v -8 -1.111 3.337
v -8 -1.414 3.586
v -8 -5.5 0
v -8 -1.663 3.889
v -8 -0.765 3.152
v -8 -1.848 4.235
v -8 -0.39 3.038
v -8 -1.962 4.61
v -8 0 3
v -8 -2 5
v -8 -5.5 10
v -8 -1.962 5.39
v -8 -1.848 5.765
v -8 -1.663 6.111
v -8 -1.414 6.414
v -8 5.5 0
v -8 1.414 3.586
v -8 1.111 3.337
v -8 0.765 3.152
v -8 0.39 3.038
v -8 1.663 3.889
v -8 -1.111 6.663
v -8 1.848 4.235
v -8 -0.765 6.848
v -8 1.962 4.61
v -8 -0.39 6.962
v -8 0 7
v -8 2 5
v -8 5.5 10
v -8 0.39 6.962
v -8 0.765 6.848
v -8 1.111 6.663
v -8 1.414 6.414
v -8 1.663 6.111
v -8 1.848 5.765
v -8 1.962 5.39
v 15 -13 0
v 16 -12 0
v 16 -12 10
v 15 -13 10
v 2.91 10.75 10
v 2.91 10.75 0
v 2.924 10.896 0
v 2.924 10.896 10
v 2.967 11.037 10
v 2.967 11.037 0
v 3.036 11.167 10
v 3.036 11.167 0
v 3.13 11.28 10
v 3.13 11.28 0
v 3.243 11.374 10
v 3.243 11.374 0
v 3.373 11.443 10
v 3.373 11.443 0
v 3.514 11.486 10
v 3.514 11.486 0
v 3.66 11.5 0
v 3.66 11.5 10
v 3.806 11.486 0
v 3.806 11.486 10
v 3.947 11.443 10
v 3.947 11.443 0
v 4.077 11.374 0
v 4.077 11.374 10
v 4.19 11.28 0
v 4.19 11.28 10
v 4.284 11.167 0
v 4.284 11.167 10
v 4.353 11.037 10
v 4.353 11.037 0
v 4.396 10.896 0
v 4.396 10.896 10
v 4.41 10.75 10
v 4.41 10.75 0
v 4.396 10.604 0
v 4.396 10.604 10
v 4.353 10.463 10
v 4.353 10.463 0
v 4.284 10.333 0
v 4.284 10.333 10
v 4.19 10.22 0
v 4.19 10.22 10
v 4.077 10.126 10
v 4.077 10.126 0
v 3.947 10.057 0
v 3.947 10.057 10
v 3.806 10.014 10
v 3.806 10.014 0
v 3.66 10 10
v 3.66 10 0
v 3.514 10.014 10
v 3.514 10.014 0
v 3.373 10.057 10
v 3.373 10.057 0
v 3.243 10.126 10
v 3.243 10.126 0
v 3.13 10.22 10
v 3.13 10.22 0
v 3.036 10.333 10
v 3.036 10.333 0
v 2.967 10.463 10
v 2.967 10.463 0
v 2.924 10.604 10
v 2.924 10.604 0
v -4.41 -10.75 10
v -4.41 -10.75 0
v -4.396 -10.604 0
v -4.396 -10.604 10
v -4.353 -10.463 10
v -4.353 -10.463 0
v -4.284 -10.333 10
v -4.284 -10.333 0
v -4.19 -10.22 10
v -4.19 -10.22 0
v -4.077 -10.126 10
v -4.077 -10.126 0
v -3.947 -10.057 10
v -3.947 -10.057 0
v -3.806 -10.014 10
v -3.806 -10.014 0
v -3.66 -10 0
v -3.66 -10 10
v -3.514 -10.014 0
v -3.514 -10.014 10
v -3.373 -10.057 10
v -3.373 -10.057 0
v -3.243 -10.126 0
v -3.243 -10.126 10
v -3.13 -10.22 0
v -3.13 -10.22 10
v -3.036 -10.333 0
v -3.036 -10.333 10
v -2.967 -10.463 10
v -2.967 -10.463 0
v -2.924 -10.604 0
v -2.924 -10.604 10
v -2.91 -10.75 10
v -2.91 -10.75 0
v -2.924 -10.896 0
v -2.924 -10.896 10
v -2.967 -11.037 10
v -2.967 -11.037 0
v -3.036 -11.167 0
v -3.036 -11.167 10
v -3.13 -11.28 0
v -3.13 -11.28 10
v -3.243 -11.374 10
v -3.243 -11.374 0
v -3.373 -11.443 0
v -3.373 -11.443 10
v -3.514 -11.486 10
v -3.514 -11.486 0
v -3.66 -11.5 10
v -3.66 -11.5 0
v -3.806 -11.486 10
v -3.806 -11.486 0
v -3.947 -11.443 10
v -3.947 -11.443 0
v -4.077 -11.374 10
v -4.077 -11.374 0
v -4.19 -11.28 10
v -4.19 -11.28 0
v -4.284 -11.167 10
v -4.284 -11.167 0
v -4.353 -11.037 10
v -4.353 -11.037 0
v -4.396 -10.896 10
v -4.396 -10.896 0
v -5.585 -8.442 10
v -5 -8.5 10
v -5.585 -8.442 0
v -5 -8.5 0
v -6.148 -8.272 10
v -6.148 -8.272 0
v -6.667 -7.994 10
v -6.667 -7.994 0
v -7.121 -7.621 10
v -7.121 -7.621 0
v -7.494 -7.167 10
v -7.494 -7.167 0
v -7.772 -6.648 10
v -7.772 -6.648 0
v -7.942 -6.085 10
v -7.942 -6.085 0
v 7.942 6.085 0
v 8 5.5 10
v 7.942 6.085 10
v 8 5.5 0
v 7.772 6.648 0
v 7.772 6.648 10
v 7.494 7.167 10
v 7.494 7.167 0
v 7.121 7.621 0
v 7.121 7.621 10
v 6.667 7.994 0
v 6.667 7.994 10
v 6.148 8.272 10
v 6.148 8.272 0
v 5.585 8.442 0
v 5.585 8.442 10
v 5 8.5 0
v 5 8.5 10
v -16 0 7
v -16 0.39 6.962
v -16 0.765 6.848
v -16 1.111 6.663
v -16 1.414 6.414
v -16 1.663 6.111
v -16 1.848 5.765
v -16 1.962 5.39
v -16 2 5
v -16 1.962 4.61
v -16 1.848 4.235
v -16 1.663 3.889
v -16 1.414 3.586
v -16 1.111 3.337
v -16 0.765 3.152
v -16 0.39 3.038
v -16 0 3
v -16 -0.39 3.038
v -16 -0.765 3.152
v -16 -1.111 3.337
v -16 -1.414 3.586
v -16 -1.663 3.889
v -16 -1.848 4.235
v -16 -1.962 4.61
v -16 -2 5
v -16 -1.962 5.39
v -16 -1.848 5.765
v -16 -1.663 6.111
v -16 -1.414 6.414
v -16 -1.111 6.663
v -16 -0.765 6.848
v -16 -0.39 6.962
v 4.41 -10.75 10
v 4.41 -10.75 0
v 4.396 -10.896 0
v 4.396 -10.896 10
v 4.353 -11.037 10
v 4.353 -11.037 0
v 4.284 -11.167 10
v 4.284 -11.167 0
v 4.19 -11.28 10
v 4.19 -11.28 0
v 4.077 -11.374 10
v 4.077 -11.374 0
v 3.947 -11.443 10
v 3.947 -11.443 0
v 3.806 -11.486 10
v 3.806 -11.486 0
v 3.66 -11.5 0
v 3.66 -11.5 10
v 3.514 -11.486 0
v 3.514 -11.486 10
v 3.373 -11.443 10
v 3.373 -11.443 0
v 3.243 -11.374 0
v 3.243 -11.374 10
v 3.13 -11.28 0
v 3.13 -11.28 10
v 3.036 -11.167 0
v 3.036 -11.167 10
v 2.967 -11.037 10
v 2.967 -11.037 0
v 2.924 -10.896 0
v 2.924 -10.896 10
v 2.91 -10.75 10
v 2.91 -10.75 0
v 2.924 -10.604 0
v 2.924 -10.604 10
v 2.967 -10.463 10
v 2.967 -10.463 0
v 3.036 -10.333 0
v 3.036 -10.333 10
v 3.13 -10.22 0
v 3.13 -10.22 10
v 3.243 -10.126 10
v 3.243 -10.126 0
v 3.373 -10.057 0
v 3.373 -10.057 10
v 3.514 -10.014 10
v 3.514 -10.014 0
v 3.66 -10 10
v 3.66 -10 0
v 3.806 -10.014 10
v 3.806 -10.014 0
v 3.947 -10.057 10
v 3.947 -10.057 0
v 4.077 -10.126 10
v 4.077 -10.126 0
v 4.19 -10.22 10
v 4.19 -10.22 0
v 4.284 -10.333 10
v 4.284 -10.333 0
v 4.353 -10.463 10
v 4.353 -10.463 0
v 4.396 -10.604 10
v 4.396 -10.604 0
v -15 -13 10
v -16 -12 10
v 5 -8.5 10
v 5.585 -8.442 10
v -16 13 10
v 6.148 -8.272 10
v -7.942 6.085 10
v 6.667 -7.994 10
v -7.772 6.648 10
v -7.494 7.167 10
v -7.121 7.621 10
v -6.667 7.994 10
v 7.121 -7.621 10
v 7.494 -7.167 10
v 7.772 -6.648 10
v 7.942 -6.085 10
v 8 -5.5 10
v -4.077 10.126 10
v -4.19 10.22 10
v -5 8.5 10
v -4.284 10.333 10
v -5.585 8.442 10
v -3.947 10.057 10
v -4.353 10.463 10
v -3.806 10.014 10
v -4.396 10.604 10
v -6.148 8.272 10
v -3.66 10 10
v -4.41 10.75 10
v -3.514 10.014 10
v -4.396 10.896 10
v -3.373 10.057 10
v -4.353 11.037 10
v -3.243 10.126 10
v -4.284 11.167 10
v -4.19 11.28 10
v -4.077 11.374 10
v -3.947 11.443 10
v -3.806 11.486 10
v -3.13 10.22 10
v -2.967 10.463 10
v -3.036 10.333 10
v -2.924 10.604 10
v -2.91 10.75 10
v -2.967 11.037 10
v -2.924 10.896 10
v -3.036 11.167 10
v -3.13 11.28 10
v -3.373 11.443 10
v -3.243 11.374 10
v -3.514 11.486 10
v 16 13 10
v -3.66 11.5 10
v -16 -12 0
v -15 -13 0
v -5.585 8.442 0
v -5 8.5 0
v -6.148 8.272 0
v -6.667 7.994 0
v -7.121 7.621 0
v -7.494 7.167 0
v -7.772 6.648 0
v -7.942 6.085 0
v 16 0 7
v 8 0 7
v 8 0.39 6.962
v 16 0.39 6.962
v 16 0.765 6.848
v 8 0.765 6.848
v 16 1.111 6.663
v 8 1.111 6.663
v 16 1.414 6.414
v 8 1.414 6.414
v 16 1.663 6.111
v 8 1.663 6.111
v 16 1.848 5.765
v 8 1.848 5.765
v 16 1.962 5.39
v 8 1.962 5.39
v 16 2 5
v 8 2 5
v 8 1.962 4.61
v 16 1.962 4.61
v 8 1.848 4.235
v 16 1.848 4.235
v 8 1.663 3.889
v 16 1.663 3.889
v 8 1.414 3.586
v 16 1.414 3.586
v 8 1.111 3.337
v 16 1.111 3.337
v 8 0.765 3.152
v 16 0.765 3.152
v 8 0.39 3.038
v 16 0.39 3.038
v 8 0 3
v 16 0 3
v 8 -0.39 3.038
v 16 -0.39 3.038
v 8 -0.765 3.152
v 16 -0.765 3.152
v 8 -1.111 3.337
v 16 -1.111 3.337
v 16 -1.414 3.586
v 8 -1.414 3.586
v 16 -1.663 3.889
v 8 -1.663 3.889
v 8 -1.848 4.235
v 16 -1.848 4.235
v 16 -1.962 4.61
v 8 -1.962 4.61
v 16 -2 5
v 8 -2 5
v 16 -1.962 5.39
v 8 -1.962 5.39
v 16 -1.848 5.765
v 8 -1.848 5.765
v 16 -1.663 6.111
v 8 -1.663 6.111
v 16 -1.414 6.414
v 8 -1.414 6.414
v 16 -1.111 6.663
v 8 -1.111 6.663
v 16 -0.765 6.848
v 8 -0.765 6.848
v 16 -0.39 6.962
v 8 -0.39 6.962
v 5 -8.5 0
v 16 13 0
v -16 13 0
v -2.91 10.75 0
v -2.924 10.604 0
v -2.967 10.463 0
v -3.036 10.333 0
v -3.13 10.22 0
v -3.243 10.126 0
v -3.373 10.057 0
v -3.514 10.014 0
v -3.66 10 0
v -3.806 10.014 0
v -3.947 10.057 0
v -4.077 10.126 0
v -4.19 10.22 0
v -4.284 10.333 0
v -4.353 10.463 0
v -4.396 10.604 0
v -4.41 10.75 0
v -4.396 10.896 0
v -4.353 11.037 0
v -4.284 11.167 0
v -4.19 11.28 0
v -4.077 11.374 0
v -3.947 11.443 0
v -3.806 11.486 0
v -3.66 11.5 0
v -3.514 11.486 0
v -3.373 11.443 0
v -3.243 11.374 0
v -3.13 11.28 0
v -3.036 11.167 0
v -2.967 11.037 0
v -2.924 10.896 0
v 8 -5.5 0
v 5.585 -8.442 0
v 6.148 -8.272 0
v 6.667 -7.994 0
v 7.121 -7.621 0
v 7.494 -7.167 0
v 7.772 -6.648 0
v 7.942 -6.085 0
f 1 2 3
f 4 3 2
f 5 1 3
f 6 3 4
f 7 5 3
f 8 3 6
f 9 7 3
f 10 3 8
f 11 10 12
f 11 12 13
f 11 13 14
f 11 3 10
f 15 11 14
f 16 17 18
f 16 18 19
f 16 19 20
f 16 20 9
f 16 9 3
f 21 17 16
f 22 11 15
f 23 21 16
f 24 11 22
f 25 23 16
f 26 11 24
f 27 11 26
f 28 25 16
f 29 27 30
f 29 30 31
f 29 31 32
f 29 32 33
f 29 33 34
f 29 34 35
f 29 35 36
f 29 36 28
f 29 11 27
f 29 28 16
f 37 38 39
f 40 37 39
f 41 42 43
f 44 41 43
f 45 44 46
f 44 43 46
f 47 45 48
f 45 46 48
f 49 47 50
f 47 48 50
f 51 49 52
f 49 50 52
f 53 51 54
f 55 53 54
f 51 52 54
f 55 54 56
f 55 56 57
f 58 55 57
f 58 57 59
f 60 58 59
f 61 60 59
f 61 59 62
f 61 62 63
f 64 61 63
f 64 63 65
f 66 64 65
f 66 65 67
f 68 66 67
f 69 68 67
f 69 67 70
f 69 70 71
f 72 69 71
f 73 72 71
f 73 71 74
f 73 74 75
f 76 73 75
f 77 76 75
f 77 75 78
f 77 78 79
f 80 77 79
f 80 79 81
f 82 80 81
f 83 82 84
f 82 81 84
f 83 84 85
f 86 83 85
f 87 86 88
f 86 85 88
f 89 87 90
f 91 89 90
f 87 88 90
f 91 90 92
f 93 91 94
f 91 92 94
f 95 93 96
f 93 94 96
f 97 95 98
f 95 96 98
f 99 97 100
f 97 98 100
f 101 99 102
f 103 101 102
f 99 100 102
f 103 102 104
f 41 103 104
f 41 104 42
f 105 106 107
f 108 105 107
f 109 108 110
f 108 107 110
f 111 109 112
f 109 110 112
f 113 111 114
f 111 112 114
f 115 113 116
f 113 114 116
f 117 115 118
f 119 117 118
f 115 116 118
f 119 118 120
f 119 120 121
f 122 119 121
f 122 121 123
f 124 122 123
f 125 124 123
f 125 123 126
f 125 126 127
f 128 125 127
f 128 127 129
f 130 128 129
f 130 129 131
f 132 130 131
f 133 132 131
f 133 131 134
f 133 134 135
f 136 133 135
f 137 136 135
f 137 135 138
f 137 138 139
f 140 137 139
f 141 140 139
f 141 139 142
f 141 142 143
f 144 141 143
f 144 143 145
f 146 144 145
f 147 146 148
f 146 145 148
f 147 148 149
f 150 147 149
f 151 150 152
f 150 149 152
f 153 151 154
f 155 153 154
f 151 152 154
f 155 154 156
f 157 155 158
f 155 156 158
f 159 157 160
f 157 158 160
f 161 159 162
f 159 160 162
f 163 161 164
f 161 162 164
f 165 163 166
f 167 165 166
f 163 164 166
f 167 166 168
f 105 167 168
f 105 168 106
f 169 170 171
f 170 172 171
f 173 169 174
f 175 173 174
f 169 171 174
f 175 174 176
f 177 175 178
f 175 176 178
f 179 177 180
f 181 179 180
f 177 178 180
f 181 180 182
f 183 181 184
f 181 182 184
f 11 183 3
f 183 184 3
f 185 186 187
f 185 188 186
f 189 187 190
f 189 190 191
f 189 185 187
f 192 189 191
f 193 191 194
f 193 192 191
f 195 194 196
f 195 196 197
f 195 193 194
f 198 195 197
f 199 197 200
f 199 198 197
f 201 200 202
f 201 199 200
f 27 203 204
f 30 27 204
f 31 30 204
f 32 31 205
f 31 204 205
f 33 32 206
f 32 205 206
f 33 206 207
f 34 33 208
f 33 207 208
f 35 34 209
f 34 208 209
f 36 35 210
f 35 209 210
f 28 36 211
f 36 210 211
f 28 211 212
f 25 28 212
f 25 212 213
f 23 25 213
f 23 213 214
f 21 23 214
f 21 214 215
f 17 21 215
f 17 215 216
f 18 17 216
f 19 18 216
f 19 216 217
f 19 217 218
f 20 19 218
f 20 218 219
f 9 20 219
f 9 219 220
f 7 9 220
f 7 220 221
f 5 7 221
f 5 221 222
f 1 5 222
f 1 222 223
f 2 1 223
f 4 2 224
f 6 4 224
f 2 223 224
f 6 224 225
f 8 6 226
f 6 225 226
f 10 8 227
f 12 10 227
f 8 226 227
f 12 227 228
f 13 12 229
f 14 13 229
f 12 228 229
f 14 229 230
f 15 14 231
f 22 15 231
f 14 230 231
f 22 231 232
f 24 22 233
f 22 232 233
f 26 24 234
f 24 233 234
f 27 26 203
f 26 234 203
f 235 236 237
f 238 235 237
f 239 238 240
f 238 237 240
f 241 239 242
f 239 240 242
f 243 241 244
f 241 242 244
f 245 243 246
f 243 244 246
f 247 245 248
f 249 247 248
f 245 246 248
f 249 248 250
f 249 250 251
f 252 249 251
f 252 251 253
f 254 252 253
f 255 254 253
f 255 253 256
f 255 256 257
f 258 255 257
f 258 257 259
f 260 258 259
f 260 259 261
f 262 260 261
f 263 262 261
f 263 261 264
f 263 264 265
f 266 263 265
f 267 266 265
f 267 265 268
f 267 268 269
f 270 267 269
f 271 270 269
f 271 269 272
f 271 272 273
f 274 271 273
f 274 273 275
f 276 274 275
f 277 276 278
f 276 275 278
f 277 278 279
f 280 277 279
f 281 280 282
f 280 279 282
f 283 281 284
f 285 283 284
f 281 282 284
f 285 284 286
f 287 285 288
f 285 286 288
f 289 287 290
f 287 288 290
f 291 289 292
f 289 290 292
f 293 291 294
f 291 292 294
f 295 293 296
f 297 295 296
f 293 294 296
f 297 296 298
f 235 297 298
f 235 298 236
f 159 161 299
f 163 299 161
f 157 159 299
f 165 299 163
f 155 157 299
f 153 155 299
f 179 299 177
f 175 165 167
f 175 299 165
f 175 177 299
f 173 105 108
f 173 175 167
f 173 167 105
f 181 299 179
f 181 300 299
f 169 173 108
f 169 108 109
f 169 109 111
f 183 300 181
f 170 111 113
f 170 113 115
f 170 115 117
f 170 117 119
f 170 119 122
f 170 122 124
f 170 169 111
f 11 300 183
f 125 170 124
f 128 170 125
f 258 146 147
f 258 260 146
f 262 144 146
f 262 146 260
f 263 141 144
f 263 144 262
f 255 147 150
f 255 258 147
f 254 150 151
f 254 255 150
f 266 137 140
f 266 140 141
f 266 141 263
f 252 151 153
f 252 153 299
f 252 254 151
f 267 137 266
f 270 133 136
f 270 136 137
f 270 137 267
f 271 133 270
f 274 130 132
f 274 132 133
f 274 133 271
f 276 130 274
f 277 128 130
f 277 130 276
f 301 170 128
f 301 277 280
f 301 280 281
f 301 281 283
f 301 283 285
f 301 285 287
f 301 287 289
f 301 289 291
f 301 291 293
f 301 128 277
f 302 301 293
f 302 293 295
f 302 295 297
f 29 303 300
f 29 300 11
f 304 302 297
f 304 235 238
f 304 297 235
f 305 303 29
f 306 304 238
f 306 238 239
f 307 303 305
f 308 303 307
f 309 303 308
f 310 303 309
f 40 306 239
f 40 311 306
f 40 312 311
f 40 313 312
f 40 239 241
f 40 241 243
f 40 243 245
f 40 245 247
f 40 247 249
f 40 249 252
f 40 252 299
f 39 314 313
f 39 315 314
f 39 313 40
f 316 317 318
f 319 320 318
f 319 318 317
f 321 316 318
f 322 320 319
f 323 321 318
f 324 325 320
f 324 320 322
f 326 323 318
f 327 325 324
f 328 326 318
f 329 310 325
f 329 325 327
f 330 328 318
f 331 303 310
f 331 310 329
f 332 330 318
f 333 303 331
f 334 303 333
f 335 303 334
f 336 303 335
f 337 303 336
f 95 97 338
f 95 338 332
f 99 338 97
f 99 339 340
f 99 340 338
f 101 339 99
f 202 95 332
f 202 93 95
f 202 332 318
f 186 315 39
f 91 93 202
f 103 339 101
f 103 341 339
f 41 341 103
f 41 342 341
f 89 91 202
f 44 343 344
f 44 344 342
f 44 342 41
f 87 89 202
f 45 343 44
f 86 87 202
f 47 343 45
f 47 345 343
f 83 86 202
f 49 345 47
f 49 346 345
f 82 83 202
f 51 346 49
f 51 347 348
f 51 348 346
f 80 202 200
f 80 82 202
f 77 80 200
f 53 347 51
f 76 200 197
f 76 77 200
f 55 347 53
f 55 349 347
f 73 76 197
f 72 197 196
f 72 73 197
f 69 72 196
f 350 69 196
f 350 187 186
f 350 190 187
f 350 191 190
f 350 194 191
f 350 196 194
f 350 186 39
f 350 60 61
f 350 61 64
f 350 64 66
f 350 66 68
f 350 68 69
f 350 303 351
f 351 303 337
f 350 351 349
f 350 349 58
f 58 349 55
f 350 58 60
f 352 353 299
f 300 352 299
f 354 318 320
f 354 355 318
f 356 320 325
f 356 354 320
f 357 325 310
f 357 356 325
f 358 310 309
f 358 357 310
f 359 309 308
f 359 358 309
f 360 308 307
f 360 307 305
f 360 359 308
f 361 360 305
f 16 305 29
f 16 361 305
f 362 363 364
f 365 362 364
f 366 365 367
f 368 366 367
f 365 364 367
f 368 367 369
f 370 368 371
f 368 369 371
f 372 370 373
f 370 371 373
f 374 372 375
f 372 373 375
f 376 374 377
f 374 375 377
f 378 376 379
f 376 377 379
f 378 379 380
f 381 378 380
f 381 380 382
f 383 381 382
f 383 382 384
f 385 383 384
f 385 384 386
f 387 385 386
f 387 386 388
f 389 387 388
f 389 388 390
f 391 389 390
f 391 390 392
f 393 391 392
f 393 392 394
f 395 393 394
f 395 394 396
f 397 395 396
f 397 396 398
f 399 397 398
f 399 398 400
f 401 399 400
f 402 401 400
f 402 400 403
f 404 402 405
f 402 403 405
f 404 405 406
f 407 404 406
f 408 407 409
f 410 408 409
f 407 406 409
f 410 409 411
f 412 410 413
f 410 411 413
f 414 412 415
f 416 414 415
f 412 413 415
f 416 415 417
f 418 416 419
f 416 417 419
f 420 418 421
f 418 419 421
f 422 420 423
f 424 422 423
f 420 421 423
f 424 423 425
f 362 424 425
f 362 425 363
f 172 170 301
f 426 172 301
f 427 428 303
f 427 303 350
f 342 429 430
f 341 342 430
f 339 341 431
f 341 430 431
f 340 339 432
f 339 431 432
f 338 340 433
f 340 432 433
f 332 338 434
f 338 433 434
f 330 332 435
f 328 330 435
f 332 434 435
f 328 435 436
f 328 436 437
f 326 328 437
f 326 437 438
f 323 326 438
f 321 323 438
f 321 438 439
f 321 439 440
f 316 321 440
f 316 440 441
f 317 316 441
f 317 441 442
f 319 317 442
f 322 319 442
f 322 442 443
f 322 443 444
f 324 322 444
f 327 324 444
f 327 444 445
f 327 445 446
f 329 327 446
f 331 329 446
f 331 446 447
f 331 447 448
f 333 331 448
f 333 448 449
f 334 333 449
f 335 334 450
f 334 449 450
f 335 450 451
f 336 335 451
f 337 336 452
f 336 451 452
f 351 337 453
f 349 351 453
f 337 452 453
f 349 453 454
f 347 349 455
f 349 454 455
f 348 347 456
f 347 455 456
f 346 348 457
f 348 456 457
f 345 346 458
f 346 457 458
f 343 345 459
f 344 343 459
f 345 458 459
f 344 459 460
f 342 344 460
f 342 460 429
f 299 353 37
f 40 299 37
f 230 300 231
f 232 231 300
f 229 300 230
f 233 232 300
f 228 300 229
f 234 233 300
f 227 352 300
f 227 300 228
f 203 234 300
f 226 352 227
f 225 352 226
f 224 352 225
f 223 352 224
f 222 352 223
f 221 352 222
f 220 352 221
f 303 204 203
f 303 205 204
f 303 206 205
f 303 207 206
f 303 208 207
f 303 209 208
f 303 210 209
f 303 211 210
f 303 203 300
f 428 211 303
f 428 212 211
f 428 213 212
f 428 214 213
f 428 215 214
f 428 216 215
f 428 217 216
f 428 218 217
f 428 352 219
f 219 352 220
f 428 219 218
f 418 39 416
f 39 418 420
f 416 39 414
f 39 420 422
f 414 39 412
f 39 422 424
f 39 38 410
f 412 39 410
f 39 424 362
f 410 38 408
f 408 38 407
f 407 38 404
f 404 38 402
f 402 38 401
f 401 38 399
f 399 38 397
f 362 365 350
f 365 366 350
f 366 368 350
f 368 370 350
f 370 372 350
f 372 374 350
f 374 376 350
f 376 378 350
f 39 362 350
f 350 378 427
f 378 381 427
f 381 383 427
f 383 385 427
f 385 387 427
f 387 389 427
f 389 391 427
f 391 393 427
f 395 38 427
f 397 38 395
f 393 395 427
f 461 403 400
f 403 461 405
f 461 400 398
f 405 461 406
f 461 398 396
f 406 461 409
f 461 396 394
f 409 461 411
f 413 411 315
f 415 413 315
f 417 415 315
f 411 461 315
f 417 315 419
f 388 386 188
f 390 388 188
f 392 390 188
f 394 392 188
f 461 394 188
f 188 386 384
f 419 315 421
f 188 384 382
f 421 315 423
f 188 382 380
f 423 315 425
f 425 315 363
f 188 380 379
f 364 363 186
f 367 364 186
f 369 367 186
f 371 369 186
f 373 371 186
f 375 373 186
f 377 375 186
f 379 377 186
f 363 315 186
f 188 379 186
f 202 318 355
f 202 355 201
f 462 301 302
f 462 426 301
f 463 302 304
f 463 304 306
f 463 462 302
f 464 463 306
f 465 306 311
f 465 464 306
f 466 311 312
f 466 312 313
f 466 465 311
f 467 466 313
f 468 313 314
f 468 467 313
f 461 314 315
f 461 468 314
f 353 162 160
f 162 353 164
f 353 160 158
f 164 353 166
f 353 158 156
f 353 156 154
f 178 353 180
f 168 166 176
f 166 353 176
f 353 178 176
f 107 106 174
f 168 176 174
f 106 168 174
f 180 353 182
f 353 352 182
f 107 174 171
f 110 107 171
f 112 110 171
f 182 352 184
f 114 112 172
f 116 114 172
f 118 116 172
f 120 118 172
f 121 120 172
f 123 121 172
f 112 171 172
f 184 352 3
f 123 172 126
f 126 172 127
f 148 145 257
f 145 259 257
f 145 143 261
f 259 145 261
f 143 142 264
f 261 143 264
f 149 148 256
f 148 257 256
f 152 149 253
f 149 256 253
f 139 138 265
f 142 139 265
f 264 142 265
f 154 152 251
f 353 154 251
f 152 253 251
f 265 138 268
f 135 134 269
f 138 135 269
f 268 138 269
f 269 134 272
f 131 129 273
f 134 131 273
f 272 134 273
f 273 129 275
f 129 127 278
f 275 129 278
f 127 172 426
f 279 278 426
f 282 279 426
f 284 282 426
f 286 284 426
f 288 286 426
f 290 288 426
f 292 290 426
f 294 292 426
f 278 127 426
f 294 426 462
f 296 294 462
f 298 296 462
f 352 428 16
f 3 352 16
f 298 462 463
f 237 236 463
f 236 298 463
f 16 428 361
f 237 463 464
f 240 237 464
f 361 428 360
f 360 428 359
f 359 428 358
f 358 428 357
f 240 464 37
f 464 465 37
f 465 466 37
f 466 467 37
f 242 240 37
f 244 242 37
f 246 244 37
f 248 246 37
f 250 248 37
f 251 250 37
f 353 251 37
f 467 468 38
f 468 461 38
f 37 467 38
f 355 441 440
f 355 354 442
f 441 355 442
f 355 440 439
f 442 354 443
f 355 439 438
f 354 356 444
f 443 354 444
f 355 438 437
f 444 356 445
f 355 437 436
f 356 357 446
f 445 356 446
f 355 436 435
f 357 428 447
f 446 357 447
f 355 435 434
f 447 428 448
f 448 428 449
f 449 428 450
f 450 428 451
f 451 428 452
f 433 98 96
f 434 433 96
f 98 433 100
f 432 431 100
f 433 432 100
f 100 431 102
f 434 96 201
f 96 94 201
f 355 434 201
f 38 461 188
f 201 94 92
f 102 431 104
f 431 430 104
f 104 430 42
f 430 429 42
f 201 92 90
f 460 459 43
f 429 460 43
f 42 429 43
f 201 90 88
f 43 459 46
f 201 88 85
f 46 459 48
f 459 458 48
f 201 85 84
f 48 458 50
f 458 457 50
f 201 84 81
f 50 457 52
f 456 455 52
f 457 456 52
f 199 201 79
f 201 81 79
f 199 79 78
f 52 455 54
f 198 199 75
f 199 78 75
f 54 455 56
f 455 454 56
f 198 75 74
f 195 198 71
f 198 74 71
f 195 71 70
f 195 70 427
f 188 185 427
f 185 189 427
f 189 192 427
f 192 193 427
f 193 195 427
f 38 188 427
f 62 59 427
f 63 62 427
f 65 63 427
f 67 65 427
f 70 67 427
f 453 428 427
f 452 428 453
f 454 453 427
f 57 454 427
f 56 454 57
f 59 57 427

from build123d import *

# Parameters (mm, degrees)
SKETCH_1_W          = 32
SKETCH_1_H          = 26
EXTRUDE_1_DEPTH     = 10
SKETCH_2_W          = 16
SKETCH_2_H          = 17
CUT_EXTRUDE_2_DEPTH = 23.912878475
FILLET_1_R          = 3
SKETCH_3_R          = 2
CUT_EXTRUDE_3_DEPTH = 36.958309193
CHAMFER_1_SIZE      = 1
SKETCH_4_R          = 0.75
CUT_EXTRUDE_1_DEPTH = 23.912878475


with BuildPart() as part:
    # Эскиз1 → Вытянуть1 (new body)
    with BuildSketch(Plane.XY):
        Rectangle(SKETCH_1_W, SKETCH_1_H)
    extrude(amount=EXTRUDE_1_DEPTH)

    # Эскиз2 → Вытянуть2 (cut, through all)
    with BuildSketch(Plane.XY.offset(10)):
        Rectangle(SKETCH_2_W, SKETCH_2_H)
    extrude(amount=-CUT_EXTRUDE_2_DEPTH, mode=Mode.SUBTRACT)

    # Скругление1
    fillet_1_edges = [part.edges().sort_by_distance(p)[0] for p in [
        (8, 8.5, 5),
        (8, -8.5, 5),
        (-8, -8.5, 5),
        (-8, 8.5, 5),
    ]]
    fillet(fillet_1_edges, radius=FILLET_1_R)

    # Эскиз3 → Вытянуть3 (cut, through all)
    with BuildSketch(Plane.ZY.offset(16)):
        with Locations((5, 0)):
            Circle(SKETCH_3_R)
    extrude(amount=-CUT_EXTRUDE_3_DEPTH, mode=Mode.SUBTRACT)

    # Фаска1
    chamfer_1_edges = [part.edges().sort_by_distance(p)[0] for p in [
        (16, -13, 5),
        (-16, -13, 5),
    ]]
    chamfer(chamfer_1_edges, length=CHAMFER_1_SIZE)

    # Эскиз4 → Вырез-Вытянуть1 (cut, through all)
    with BuildSketch(Plane(origin=(0, 0, 0), x_dir=(-1, 0, 0), z_dir=(0, 0, -1))):
        with Locations((-3.66, 10.75)):
            Circle(SKETCH_4_R)
        with Locations(Location((3.66, 10.75, 0), (0, 0, 180))):
            Circle(SKETCH_4_R)
        with Locations((3.66, -10.75)):
            Circle(SKETCH_4_R)
        with Locations(Location((-3.66, -10.75, 0), (0, 0, 180))):
            Circle(SKETCH_4_R)
    extrude(amount=-CUT_EXTRUDE_1_DEPTH, mode=Mode.SUBTRACT)


solid = part.part
